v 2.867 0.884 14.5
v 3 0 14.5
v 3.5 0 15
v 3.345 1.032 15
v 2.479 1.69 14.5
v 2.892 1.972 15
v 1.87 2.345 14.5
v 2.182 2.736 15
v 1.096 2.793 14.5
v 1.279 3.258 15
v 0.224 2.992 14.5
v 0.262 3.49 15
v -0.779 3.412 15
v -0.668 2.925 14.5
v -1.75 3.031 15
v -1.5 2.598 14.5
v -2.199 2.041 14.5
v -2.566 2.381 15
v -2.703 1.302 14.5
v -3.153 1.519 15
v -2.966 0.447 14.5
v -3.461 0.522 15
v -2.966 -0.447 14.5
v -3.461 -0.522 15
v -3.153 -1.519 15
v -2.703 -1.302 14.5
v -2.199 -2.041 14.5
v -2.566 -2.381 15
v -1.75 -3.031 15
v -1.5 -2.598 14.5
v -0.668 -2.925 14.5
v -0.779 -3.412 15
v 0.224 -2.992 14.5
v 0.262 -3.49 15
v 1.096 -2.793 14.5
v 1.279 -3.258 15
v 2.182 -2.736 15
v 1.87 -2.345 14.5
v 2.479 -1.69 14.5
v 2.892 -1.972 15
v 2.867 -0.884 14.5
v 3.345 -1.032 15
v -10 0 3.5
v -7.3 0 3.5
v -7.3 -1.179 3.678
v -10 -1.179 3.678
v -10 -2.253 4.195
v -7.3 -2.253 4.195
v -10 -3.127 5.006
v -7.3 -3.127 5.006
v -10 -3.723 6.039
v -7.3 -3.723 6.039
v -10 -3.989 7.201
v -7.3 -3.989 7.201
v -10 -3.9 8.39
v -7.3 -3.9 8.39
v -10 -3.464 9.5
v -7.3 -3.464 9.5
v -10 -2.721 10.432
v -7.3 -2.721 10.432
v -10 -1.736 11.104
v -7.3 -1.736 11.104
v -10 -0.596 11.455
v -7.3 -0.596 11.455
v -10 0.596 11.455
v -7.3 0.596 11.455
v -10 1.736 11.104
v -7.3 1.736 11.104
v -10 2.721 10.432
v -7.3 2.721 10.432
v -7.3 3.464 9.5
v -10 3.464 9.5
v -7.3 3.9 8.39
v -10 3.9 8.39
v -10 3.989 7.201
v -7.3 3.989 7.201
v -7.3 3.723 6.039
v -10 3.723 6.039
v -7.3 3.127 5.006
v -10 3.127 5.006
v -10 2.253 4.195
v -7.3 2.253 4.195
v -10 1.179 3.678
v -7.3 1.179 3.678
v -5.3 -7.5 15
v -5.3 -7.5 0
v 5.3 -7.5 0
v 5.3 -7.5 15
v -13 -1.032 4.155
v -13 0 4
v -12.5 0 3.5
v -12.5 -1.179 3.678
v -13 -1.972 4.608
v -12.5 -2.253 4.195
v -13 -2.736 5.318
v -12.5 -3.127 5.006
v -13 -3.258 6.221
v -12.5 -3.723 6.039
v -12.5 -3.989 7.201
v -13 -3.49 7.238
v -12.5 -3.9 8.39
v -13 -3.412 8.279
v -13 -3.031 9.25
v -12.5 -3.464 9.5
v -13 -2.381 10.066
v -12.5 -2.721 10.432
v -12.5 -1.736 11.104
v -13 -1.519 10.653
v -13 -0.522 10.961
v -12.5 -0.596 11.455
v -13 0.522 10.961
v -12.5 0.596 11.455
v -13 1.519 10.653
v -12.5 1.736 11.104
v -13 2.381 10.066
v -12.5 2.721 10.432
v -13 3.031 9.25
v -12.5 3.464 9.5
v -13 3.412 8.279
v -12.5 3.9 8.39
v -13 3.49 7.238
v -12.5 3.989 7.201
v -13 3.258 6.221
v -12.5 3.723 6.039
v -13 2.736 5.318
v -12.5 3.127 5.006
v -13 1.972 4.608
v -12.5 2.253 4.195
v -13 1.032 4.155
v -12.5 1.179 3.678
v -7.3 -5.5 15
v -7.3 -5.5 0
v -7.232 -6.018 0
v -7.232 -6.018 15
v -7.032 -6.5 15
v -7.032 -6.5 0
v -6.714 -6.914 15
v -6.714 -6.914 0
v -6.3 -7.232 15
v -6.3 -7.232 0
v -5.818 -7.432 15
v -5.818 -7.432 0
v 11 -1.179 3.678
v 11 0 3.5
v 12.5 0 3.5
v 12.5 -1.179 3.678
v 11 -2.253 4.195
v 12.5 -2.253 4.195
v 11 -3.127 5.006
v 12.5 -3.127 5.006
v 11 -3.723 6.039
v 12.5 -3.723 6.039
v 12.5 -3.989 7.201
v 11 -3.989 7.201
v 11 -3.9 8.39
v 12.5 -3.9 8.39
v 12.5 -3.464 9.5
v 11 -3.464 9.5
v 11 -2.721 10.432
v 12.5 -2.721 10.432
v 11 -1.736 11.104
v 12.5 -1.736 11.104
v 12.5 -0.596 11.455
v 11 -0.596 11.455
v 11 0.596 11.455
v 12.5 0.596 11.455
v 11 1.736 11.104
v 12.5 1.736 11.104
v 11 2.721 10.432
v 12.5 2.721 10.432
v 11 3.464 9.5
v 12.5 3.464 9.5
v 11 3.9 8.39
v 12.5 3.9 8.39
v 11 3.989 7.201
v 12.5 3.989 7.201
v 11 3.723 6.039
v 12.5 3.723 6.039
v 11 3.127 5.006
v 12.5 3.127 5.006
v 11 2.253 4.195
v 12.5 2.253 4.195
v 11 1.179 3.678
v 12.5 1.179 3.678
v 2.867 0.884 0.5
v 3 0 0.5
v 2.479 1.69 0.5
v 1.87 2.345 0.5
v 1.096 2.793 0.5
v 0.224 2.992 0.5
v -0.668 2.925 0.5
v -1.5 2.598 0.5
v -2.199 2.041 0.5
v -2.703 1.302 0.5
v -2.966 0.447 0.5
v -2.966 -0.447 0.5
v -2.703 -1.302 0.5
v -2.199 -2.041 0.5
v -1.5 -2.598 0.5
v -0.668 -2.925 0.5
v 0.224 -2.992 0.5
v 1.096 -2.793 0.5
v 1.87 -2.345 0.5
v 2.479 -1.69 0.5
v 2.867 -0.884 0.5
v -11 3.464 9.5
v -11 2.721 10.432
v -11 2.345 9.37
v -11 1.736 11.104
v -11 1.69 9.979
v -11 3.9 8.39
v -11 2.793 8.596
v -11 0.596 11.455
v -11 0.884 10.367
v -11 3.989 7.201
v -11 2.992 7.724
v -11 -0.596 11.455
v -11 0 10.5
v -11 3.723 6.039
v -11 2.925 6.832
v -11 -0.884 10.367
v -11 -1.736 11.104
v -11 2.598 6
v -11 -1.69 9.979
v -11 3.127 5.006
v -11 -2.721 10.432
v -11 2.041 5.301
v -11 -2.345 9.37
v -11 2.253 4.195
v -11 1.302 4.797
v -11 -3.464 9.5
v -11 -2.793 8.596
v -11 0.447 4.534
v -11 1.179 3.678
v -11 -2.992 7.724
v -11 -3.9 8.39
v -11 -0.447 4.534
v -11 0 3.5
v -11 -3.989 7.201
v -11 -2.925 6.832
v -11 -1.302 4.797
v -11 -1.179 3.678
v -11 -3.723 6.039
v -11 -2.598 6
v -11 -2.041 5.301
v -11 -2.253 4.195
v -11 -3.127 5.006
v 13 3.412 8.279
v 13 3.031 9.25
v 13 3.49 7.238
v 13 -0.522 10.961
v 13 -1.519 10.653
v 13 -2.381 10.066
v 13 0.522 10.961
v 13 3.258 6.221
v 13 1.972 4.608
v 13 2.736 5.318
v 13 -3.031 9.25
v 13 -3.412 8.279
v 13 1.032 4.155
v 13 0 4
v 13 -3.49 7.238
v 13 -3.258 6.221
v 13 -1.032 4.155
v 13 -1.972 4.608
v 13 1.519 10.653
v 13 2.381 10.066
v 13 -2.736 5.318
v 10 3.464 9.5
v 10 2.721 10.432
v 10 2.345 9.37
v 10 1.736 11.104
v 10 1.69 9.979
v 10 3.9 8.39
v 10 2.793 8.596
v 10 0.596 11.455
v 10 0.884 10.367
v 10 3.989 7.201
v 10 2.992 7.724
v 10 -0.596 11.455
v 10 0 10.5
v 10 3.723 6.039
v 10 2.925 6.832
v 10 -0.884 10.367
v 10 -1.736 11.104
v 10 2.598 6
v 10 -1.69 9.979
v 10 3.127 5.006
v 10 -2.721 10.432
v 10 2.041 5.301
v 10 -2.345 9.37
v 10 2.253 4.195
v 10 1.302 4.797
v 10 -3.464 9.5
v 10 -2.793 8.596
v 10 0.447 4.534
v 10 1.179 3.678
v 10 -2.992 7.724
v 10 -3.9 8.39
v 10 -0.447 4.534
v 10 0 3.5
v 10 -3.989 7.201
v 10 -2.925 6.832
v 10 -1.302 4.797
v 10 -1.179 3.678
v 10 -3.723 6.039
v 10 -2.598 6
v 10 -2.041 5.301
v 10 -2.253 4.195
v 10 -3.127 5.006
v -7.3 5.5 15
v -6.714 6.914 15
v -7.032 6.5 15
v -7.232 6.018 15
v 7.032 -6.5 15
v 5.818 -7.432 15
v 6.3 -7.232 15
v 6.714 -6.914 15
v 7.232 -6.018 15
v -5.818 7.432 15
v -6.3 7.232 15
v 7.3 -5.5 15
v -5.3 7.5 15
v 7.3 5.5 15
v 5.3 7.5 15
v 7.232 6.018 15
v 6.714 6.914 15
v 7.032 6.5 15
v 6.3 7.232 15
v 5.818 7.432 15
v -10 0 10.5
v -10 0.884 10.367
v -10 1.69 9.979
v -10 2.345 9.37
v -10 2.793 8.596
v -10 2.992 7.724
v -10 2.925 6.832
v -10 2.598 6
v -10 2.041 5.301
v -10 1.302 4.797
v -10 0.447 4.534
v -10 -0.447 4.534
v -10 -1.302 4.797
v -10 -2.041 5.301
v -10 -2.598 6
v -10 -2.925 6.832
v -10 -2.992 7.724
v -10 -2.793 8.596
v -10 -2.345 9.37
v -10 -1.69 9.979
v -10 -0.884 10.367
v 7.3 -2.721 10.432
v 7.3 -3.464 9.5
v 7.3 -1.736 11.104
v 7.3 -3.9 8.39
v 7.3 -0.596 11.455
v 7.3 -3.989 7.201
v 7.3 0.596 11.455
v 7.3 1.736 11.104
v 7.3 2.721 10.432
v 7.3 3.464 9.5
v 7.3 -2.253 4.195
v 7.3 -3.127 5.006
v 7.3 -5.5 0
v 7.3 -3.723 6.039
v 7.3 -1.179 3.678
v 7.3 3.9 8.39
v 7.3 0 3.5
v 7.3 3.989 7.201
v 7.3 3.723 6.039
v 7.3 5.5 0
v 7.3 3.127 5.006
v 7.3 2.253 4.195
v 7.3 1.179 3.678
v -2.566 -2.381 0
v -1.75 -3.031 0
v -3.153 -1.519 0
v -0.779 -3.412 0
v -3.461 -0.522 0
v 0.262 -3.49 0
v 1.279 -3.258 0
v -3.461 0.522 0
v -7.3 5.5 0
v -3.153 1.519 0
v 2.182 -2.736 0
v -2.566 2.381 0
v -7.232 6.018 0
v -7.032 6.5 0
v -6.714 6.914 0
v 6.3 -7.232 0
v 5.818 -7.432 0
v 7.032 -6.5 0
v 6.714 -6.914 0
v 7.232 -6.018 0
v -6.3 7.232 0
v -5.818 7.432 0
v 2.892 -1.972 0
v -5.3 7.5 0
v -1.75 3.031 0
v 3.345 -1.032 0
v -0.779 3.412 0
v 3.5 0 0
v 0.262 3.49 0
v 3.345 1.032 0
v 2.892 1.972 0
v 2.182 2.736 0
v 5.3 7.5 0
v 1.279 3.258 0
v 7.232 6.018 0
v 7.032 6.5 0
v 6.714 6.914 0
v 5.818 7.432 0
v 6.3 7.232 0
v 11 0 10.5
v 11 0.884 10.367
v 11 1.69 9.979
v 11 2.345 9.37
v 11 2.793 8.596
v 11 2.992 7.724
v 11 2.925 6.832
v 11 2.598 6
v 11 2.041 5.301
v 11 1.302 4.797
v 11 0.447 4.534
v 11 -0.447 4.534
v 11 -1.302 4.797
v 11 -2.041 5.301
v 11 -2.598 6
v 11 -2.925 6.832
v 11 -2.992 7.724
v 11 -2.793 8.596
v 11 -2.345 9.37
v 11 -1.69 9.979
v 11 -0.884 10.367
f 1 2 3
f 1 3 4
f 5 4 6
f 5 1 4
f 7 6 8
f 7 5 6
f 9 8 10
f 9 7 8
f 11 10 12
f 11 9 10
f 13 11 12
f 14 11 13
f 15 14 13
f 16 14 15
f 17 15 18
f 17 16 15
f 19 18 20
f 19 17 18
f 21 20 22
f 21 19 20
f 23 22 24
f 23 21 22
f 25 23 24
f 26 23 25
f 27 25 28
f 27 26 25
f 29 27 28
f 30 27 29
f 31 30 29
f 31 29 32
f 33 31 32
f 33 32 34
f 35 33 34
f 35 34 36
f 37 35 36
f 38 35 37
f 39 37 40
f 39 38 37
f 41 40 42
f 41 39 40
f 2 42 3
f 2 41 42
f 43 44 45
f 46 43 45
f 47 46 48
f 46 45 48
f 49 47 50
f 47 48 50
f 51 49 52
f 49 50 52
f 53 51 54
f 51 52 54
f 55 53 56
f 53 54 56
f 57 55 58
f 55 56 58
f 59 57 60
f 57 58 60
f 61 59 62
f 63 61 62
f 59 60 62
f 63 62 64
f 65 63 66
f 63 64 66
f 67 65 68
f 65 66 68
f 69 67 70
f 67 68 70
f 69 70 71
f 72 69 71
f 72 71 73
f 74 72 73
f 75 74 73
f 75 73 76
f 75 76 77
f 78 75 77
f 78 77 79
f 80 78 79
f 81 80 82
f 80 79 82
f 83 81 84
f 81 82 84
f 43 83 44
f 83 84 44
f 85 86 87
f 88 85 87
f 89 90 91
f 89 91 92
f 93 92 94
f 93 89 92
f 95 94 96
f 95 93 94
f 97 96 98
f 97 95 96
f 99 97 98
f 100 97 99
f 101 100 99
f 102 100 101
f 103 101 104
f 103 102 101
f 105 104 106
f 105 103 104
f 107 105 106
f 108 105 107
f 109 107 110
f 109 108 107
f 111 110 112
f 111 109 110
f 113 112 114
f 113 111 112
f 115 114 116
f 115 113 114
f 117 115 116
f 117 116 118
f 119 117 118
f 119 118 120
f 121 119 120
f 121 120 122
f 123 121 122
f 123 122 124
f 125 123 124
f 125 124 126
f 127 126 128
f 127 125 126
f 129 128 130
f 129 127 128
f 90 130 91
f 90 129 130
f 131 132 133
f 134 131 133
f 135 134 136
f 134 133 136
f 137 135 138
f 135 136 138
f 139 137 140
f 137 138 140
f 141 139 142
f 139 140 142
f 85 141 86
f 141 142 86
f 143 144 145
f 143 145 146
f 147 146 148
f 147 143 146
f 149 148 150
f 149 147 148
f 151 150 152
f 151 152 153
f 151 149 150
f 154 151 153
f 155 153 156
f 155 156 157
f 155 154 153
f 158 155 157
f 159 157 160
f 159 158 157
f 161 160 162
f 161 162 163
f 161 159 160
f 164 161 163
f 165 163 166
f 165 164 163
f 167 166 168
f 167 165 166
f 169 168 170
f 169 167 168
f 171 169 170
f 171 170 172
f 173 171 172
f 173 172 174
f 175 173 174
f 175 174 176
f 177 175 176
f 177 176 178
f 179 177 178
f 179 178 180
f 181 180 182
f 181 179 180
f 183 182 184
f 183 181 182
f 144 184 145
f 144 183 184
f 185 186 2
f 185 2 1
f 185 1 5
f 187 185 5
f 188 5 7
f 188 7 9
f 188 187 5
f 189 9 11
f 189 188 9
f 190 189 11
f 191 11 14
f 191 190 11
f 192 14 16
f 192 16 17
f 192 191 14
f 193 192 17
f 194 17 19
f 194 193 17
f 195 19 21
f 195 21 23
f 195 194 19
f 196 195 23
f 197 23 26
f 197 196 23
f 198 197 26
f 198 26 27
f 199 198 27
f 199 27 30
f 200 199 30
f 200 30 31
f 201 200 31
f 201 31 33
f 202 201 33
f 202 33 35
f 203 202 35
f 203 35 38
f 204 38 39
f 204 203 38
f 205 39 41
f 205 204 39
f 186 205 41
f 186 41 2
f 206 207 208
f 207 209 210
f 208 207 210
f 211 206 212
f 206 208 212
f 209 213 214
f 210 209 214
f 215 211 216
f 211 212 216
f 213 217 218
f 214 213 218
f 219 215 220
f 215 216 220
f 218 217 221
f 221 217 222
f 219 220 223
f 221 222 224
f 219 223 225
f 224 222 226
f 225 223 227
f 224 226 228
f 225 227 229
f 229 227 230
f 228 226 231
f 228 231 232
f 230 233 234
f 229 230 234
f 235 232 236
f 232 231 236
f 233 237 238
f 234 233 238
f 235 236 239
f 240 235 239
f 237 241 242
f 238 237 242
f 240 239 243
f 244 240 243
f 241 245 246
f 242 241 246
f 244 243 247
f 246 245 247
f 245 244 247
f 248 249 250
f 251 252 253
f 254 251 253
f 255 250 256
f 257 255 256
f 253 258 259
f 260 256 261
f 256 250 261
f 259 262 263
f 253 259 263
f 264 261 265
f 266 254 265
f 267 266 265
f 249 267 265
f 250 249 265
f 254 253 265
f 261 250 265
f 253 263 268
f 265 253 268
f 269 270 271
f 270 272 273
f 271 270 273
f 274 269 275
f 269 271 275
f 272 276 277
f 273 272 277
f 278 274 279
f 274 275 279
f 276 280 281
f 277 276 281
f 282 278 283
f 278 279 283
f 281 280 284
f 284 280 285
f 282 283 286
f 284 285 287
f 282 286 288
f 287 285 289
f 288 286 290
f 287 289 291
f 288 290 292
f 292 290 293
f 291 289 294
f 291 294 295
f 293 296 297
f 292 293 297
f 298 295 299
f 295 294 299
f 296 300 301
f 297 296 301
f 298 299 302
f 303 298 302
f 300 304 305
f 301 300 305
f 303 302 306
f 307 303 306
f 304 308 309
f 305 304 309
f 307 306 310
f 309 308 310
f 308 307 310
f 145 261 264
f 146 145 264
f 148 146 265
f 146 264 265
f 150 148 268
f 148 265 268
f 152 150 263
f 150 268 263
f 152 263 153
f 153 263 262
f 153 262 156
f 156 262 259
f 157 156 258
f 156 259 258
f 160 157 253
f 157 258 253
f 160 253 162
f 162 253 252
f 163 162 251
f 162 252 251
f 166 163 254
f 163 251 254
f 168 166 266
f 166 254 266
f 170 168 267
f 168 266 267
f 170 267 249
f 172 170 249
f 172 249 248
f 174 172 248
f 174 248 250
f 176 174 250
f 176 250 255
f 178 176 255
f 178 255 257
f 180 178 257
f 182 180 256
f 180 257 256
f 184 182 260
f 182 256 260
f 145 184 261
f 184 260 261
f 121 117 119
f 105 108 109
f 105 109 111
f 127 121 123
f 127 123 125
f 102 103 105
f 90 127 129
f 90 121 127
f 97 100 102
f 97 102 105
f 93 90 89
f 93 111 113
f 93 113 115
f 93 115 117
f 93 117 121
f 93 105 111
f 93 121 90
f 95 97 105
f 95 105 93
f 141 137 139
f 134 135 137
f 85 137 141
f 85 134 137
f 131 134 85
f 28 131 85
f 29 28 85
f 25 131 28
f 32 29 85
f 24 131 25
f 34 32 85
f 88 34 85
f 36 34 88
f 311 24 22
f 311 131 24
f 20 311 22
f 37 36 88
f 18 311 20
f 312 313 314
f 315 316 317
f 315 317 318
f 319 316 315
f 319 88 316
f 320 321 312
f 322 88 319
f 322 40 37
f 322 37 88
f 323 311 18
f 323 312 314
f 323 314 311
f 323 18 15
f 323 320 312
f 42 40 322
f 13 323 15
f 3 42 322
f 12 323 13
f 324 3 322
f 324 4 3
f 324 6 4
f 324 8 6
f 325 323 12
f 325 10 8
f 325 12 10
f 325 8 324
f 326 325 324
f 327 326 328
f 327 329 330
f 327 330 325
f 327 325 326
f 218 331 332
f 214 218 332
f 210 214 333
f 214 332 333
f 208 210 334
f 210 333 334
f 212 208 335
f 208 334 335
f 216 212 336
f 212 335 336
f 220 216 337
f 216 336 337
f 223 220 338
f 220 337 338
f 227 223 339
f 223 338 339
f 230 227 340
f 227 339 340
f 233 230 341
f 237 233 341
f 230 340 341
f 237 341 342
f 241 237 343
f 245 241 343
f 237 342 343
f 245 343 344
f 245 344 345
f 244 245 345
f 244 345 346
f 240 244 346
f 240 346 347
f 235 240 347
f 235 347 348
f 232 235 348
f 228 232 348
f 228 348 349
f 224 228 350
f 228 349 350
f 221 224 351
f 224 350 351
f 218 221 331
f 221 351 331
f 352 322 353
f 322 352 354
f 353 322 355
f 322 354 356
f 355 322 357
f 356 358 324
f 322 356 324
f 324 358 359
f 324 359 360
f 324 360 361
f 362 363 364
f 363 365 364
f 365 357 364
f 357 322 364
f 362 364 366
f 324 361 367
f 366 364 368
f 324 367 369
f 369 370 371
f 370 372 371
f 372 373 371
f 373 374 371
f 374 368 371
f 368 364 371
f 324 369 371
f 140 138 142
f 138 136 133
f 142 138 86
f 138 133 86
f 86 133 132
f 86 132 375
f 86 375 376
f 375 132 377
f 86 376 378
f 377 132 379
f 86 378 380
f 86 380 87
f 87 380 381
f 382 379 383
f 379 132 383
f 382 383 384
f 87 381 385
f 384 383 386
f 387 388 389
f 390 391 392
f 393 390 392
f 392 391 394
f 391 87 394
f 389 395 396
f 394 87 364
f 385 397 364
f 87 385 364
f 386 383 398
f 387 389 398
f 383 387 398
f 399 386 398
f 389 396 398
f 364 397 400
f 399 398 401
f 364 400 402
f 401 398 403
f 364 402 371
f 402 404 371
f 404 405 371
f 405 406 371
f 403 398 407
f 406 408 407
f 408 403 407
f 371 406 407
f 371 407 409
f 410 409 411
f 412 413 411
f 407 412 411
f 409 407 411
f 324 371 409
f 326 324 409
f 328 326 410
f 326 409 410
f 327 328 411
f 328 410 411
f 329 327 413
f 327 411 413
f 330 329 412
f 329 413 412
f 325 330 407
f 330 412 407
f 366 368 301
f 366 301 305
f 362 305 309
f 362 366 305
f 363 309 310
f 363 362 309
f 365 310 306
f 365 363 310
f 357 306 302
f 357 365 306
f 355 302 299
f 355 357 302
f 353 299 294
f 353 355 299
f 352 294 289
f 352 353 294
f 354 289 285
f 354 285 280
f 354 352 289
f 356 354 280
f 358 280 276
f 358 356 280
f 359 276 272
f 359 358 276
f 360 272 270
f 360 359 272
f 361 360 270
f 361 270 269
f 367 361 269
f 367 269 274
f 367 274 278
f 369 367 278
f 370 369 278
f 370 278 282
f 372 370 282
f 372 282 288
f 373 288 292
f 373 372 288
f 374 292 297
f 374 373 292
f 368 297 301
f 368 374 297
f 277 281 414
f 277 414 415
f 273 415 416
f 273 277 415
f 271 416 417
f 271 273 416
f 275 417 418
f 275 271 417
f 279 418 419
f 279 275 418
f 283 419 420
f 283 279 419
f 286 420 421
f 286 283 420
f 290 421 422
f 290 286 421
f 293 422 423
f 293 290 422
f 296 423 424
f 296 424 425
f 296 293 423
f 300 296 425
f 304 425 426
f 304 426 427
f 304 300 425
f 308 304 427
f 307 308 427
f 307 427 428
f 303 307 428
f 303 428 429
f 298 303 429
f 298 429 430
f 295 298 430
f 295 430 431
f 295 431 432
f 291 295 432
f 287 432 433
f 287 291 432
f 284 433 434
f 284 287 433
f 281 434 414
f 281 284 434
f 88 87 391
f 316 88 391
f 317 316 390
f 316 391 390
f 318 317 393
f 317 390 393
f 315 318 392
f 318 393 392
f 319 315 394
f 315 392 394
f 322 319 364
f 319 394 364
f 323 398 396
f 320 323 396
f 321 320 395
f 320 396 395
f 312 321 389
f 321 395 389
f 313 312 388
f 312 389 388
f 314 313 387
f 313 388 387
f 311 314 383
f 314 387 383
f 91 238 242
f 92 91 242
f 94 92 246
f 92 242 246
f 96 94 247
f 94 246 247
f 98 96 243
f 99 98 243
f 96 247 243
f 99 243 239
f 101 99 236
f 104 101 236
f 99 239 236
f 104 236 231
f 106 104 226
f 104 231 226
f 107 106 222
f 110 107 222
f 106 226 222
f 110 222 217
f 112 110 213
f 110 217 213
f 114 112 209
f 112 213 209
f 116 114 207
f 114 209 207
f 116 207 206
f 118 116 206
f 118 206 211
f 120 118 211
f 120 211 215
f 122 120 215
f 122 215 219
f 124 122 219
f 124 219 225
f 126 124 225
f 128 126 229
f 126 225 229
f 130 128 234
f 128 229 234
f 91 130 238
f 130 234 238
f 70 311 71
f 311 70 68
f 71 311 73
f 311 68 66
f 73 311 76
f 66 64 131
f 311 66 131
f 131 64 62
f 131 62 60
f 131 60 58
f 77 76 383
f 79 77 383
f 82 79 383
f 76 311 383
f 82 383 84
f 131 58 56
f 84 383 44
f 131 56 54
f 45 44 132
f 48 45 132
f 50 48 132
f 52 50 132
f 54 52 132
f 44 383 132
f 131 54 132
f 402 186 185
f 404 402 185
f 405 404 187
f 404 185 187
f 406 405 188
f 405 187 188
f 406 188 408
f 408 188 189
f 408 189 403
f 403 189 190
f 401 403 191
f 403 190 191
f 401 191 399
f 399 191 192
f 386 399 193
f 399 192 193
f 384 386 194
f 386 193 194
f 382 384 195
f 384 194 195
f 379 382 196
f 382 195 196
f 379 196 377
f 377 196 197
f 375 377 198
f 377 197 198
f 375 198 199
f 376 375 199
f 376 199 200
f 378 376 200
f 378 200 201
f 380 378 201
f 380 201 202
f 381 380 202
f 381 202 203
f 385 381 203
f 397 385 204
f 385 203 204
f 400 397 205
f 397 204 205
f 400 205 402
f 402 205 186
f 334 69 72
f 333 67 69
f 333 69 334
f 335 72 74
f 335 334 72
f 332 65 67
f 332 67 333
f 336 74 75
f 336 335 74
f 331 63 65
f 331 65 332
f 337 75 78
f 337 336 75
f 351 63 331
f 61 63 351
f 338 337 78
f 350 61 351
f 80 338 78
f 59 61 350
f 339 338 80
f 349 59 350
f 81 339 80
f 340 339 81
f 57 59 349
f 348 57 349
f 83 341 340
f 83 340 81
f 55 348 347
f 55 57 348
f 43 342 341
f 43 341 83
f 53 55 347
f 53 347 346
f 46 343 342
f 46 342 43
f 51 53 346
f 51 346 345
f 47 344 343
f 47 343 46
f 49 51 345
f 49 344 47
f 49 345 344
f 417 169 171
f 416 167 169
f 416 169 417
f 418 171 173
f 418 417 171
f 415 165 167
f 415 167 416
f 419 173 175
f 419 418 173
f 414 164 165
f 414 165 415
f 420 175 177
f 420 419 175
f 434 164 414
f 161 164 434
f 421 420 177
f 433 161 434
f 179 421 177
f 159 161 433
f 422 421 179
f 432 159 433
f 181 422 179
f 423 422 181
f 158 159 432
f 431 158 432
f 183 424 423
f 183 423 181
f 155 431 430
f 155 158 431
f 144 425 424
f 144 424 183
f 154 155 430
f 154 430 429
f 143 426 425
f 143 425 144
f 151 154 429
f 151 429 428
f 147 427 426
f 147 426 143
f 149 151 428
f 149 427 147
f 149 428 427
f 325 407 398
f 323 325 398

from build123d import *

# Parameters (mm, degrees)
SKETCH1_R                = 3
BOSS_EXTRUDE1_DEPTH      = 15
SKETCH2_R                = 4
BOSS_EXTRUDE2_DEPTH      = 2.7
SKETCH3_R                = 3
BOSS_EXTRUDE3_DEPTH      = 1
SKETCH4_R                = 4
BOSS_EXTRUDE4_DEPTH      = 2
CHAMFER1_SIZE            = 0.5
CHAMFER1_OF_MIRROR1_SIZE = 0.5
CHAMFER2_SIZE            = 0.5


with BuildPart() as part:
    # Sketch1 → Boss-Extrude1 (new body)
    with BuildSketch(Plane.XY):
        with BuildLine():
            Line((-5.3, -7.5), (5.3, -7.5))
            ThreePointArc((5.3, -7.5), (6.714213562, -6.914213562), (7.3, -5.5))
            Line((7.3, -5.5), (7.3, 5.5))
            ThreePointArc((7.3, 5.5), (6.714213562, 6.914213562), (5.3, 7.5))
            Line((5.3, 7.5), (-5.3, 7.5))
            ThreePointArc((-5.3, 7.5), (-6.714213562, 6.914213562), (-7.3, 5.5))
            Line((-7.3, 5.5), (-7.3, -5.5))
            ThreePointArc((-7.3, -5.5), (-6.714213562, -6.914213562), (-5.3, -7.5))
        make_face()
        Circle(SKETCH1_R, mode=Mode.SUBTRACT)
    extrude(amount=BOSS_EXTRUDE1_DEPTH)

    # Sketch2 → Boss-Extrude2 (add)
    with BuildSketch(Plane.ZY.offset(7.3)):
        with Locations(Location((7.5, 0, 0), (0, 0, 180))):
            Circle(SKETCH2_R)
    boss_extrude2 = extrude(amount=BOSS_EXTRUDE2_DEPTH)

    # Sketch3 → Boss-Extrude3 (add)
    with BuildSketch(Plane.ZY.offset(10)):
        with Locations((7.5, 0)):
            Circle(SKETCH3_R)
    boss_extrude3 = extrude(amount=BOSS_EXTRUDE3_DEPTH)

    # Sketch4 → Boss-Extrude4 (add)
    with BuildSketch(Plane.ZY.offset(11)):
        with Locations(Location((7.5, 0, 0), (0, 0, 180))):
            Circle(SKETCH4_R)
    boss_extrude4 = extrude(amount=BOSS_EXTRUDE4_DEPTH)

    # Chamfer1
    chamfer1_edges = [part.edges().sort_by_distance(p)[0] for p in [
        (-13, 0, 11.5),
    ]]
    chamfer(chamfer1_edges, length=CHAMFER1_SIZE)

    # Mirror1: Boss-Extrude2, Boss-Extrude3, Boss-Extrude4 across plane
    add(boss_extrude2.mirror(Plane(origin=(0, 0, 0), x_dir=(0, 0, 1), z_dir=(1, 0, 0))))
    add(boss_extrude3.mirror(Plane(origin=(0, 0, 0), x_dir=(0, 0, 1), z_dir=(1, 0, 0))))
    add(boss_extrude4.mirror(Plane(origin=(0, 0, 0), x_dir=(0, 0, 1), z_dir=(1, 0, 0))))

    # Chamfer1 of Mirror1
    chamfer1_of_mirror1_edges = [part.edges().sort_by_distance(p)[0] for p in [
        (13, 0, 11.5),
    ]]
    chamfer(chamfer1_of_mirror1_edges, length=CHAMFER1_OF_MIRROR1_SIZE)

    # Chamfer2
    chamfer2_edges = [part.edges().sort_by_distance(p)[0] for p in [
        (-3, 0, 0),
        (-3, 0, 15),
    ]]
    chamfer(chamfer2_edges, length=CHAMFER2_SIZE)


solid = part.part
